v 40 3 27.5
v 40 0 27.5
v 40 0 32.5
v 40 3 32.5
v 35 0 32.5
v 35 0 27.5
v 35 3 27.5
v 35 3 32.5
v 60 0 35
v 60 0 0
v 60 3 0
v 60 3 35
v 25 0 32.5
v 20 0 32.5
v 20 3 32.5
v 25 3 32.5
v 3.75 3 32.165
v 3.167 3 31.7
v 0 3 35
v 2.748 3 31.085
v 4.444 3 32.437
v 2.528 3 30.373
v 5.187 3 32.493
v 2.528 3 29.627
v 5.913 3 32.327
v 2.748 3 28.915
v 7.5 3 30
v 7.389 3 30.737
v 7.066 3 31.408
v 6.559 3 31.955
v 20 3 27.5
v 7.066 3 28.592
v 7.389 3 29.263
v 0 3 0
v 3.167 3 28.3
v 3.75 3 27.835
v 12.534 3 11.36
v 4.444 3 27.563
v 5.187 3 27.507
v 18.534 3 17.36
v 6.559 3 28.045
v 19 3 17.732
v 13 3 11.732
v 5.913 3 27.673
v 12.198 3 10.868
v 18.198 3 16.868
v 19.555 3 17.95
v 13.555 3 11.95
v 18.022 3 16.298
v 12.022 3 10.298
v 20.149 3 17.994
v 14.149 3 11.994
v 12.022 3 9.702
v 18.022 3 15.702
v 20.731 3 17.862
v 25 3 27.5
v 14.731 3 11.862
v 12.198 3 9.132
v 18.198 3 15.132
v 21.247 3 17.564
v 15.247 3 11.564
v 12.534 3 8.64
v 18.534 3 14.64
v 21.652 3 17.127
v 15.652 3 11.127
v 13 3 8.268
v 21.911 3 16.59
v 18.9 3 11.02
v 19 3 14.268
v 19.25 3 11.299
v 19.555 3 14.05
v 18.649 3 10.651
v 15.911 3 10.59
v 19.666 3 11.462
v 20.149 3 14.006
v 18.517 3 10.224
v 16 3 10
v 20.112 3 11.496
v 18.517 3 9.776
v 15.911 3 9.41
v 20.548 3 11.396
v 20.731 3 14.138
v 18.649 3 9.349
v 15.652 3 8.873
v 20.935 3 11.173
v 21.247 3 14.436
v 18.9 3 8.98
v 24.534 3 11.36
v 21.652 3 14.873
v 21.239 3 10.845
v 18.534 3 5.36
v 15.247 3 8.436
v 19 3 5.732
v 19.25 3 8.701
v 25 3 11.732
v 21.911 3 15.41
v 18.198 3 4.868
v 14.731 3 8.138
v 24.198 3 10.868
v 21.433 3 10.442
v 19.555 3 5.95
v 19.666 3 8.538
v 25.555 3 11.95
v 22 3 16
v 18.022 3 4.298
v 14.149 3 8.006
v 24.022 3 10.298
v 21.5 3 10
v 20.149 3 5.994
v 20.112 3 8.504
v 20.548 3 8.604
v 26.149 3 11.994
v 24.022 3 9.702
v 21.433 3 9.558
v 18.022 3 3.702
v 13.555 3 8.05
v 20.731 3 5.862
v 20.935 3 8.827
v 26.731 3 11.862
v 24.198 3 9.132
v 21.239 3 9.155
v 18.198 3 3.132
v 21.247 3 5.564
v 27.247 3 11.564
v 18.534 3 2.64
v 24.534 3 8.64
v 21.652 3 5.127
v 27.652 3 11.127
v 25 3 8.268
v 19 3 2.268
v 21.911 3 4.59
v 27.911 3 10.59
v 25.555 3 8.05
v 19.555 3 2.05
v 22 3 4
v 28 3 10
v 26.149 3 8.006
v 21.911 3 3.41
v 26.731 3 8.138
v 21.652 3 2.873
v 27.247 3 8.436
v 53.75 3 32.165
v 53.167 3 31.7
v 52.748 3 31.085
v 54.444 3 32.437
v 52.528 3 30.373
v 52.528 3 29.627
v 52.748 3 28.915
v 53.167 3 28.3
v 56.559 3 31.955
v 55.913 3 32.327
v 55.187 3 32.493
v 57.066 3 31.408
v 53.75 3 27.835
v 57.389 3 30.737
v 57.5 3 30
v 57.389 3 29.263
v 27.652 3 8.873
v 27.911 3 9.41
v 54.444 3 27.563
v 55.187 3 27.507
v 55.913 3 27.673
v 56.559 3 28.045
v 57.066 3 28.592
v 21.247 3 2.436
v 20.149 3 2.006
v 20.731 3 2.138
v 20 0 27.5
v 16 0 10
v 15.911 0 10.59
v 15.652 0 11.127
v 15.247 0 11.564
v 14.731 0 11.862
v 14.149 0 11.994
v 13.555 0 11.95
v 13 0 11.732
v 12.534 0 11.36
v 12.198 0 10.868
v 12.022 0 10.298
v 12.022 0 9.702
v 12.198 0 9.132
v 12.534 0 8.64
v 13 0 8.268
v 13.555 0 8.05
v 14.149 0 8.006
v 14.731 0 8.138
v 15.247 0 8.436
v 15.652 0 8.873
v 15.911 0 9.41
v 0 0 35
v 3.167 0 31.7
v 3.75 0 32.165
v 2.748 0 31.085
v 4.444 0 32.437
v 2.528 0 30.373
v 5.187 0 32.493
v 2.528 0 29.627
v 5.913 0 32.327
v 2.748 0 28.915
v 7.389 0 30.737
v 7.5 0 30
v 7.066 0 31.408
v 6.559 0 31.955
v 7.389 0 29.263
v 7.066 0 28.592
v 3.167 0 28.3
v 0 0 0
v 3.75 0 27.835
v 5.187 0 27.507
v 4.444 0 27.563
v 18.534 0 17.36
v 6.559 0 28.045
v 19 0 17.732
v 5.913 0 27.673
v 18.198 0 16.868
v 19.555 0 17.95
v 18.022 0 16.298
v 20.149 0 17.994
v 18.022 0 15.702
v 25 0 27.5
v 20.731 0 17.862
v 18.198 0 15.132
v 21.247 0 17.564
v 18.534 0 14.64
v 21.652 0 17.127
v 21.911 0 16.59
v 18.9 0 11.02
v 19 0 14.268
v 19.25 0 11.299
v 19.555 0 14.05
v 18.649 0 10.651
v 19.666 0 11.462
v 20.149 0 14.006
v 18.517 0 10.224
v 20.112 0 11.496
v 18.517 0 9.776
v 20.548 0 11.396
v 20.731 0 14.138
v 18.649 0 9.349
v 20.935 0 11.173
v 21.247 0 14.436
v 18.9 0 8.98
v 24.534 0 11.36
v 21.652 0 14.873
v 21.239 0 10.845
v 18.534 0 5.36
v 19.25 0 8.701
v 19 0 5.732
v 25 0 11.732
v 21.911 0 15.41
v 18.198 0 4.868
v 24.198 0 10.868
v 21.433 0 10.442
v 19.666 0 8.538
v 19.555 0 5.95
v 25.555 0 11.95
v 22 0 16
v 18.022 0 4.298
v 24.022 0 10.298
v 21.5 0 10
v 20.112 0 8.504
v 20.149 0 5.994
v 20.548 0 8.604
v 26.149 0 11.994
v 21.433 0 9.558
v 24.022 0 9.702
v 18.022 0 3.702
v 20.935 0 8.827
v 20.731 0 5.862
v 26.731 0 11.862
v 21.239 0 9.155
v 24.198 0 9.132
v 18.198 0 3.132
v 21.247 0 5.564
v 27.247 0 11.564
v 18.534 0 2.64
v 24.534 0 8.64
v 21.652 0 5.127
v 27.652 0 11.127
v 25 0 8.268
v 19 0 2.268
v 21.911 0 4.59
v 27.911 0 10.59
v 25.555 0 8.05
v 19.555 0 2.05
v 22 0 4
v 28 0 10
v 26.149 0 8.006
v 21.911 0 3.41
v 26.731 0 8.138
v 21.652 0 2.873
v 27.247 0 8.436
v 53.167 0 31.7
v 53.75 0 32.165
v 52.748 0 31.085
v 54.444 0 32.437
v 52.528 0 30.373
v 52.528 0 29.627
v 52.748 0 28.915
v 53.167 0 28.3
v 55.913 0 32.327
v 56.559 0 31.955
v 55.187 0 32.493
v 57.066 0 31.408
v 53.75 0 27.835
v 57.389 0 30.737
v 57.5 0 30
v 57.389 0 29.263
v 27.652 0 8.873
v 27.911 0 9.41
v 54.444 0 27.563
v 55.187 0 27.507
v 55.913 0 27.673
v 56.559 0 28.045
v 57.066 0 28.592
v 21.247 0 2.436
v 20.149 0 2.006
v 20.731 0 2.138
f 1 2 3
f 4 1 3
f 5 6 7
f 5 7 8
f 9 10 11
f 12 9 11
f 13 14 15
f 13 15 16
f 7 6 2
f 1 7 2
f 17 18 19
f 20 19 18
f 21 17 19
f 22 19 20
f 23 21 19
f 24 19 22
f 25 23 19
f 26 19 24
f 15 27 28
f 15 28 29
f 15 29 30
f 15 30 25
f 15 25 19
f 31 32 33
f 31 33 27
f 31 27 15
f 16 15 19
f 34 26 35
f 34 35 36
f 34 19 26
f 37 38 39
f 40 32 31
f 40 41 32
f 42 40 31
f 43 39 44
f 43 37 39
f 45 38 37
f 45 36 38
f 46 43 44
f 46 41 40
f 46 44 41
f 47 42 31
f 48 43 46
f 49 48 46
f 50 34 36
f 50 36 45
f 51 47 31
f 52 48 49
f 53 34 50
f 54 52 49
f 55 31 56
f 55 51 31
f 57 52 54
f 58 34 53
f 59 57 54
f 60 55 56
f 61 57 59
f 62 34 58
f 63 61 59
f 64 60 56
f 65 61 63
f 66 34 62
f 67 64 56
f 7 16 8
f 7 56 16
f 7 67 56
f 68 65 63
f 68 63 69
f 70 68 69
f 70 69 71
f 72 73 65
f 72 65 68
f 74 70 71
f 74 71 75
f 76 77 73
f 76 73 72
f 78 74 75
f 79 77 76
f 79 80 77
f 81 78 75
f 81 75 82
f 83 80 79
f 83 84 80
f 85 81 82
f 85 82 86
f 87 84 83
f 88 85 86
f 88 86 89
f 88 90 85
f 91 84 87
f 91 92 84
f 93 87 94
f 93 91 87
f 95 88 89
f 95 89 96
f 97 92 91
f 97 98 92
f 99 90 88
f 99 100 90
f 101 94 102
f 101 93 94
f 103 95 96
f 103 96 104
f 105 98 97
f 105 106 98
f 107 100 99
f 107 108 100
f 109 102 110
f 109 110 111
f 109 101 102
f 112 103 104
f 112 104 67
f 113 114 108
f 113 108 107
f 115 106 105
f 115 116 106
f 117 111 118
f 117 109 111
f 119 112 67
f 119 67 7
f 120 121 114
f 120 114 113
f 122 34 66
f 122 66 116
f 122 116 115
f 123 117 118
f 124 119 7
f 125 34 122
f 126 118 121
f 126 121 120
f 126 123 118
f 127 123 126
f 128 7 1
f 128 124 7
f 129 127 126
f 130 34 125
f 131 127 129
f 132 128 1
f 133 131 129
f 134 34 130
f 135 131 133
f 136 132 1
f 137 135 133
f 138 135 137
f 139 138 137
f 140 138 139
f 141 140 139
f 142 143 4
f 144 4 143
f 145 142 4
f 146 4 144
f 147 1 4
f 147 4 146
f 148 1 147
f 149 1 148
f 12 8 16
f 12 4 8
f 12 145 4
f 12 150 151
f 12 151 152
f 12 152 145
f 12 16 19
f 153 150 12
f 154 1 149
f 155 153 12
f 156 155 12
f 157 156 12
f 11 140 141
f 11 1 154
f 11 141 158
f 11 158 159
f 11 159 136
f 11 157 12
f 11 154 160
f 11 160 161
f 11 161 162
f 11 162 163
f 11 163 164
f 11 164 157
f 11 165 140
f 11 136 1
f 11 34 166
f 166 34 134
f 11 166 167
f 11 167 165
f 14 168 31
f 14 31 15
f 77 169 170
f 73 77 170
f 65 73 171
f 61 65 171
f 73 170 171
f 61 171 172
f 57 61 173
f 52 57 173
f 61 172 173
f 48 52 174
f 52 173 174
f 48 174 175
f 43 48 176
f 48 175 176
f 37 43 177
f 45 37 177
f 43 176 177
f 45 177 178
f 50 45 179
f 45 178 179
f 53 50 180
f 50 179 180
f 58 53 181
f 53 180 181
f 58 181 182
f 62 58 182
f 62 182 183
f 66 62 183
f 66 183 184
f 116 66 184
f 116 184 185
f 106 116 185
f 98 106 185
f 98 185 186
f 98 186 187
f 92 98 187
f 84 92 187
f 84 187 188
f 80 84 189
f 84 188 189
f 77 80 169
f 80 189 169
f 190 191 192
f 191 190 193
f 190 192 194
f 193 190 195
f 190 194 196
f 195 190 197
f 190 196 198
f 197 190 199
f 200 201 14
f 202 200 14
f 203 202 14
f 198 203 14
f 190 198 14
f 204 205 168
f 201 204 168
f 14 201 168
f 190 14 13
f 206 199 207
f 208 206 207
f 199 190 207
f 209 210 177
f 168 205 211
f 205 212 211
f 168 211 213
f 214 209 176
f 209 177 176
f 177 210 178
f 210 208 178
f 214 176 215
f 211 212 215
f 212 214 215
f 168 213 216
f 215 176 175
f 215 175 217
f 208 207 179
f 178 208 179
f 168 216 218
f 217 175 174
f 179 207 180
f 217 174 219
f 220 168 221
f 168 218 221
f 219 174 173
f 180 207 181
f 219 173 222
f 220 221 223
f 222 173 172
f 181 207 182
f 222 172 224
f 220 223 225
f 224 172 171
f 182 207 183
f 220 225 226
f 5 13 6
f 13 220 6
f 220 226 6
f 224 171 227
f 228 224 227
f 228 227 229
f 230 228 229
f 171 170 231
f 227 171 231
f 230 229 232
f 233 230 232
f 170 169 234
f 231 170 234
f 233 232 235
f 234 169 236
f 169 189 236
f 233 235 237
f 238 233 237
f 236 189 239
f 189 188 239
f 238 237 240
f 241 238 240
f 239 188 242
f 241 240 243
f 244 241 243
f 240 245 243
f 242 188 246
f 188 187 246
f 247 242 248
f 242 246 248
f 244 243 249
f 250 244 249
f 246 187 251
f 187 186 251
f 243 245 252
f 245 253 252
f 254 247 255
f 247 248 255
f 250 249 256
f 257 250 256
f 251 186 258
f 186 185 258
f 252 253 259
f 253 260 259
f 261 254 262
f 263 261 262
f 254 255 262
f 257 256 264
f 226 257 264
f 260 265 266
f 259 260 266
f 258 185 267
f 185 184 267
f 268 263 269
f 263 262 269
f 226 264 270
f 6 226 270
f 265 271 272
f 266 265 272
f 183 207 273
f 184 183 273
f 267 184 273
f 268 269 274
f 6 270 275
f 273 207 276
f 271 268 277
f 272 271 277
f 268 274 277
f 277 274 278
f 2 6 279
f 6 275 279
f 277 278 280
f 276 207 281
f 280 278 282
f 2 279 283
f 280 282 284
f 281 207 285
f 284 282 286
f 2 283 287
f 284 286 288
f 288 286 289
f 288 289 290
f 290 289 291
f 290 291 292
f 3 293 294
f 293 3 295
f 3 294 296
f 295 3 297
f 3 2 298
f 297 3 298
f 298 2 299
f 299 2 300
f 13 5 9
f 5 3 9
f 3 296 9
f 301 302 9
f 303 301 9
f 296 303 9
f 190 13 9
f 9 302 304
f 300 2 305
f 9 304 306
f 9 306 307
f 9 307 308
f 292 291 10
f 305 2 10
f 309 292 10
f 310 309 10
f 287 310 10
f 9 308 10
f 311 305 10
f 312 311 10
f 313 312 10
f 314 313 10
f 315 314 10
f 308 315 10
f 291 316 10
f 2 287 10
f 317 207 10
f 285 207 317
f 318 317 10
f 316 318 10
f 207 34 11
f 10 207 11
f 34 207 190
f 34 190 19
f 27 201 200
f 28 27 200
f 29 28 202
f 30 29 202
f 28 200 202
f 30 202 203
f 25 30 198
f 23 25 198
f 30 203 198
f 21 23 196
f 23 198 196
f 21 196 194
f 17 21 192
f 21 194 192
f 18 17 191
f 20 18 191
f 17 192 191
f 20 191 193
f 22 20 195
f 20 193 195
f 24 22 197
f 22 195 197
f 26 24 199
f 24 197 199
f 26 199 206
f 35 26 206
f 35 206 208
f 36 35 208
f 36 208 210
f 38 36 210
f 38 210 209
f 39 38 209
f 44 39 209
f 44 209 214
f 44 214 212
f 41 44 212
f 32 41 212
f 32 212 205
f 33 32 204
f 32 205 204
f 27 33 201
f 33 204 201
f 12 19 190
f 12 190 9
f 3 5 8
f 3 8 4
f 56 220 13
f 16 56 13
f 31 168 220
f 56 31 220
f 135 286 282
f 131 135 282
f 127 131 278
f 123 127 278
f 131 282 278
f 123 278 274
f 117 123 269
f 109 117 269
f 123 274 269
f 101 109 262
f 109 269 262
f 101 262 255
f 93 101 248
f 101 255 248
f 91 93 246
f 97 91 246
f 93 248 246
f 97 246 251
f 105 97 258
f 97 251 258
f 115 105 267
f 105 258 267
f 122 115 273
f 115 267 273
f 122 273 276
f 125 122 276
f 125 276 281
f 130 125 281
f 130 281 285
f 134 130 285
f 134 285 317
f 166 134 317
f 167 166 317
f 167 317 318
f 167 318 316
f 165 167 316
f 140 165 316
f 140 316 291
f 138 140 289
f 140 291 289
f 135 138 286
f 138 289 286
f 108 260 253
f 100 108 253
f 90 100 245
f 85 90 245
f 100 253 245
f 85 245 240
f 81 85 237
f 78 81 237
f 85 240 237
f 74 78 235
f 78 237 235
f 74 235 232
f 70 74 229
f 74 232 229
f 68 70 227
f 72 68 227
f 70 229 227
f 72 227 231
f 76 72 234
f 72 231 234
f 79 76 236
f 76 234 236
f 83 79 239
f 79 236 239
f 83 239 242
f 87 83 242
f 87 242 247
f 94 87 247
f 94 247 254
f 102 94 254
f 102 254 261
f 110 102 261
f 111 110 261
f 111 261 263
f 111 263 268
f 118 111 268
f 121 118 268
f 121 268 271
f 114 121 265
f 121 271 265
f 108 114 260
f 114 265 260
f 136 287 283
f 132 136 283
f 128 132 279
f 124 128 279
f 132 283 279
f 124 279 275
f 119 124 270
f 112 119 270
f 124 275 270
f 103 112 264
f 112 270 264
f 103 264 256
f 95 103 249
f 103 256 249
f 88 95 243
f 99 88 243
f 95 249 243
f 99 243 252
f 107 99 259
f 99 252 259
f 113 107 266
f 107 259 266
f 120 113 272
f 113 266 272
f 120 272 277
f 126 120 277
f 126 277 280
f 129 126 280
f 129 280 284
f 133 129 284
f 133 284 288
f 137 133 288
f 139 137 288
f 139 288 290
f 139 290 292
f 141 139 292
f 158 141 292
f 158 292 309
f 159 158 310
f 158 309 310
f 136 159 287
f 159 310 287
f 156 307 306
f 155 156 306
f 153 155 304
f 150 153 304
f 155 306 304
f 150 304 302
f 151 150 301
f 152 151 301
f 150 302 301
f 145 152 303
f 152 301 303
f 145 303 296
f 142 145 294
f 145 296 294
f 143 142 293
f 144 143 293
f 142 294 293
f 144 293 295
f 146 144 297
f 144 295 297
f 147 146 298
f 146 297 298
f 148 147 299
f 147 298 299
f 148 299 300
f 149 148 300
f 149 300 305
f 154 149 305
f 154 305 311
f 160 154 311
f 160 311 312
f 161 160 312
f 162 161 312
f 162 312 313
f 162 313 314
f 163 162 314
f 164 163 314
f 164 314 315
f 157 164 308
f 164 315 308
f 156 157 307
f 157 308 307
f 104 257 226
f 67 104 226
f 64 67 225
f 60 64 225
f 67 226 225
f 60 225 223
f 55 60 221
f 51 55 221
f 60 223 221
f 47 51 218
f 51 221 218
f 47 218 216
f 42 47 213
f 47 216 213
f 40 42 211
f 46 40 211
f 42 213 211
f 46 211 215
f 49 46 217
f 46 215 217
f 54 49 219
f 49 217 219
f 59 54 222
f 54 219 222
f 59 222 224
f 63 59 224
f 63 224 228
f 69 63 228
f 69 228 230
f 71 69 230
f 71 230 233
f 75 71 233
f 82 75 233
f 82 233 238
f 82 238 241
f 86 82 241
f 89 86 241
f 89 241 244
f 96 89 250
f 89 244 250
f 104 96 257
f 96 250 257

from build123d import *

# Parameters (mm, degrees)
SKETCH_W      = 60
SKETCH_H      = 3
PAD_DEPTH     = 35
SKETCH001_R   = 1.5
SKETCH001_R_2 = 2
SKETCH001_R_3 = 2.5
SKETCH001_W   = 5
SKETCH001_H   = 5
POCKET_DEPTH  = 3


with BuildPart() as part:
    # Sketch → Pad (new body)
    with BuildSketch(Plane.XY):
        with Locations((30, 1.5)):
            Rectangle(SKETCH_W, SKETCH_H)
    extrude(amount=PAD_DEPTH)

    # Sketch001 → Pocket (cut)
    with BuildSketch(Plane.XZ):
        with Locations((20, 10)):
            Circle(SKETCH001_R)
        with Locations((26, 10)):
            Circle(SKETCH001_R_2)
        with Locations((20, 16)):
            Circle(SKETCH001_R_2)
        with Locations((14, 10)):
            Circle(SKETCH001_R_2)
        with Locations((20, 4)):
            Circle(SKETCH001_R_2)
        with Locations((5, 30)):
            Circle(SKETCH001_R_3)
        with Locations((55, 30)):
            Circle(SKETCH001_R_3)
        with Locations((22.5, 30)):
            Rectangle(SKETCH001_W, SKETCH001_H)
        with Locations((37.5, 30)):
            Rectangle(SKETCH001_W, SKETCH001_H)
    extrude(amount=-POCKET_DEPTH, mode=Mode.SUBTRACT)


solid = part.part
